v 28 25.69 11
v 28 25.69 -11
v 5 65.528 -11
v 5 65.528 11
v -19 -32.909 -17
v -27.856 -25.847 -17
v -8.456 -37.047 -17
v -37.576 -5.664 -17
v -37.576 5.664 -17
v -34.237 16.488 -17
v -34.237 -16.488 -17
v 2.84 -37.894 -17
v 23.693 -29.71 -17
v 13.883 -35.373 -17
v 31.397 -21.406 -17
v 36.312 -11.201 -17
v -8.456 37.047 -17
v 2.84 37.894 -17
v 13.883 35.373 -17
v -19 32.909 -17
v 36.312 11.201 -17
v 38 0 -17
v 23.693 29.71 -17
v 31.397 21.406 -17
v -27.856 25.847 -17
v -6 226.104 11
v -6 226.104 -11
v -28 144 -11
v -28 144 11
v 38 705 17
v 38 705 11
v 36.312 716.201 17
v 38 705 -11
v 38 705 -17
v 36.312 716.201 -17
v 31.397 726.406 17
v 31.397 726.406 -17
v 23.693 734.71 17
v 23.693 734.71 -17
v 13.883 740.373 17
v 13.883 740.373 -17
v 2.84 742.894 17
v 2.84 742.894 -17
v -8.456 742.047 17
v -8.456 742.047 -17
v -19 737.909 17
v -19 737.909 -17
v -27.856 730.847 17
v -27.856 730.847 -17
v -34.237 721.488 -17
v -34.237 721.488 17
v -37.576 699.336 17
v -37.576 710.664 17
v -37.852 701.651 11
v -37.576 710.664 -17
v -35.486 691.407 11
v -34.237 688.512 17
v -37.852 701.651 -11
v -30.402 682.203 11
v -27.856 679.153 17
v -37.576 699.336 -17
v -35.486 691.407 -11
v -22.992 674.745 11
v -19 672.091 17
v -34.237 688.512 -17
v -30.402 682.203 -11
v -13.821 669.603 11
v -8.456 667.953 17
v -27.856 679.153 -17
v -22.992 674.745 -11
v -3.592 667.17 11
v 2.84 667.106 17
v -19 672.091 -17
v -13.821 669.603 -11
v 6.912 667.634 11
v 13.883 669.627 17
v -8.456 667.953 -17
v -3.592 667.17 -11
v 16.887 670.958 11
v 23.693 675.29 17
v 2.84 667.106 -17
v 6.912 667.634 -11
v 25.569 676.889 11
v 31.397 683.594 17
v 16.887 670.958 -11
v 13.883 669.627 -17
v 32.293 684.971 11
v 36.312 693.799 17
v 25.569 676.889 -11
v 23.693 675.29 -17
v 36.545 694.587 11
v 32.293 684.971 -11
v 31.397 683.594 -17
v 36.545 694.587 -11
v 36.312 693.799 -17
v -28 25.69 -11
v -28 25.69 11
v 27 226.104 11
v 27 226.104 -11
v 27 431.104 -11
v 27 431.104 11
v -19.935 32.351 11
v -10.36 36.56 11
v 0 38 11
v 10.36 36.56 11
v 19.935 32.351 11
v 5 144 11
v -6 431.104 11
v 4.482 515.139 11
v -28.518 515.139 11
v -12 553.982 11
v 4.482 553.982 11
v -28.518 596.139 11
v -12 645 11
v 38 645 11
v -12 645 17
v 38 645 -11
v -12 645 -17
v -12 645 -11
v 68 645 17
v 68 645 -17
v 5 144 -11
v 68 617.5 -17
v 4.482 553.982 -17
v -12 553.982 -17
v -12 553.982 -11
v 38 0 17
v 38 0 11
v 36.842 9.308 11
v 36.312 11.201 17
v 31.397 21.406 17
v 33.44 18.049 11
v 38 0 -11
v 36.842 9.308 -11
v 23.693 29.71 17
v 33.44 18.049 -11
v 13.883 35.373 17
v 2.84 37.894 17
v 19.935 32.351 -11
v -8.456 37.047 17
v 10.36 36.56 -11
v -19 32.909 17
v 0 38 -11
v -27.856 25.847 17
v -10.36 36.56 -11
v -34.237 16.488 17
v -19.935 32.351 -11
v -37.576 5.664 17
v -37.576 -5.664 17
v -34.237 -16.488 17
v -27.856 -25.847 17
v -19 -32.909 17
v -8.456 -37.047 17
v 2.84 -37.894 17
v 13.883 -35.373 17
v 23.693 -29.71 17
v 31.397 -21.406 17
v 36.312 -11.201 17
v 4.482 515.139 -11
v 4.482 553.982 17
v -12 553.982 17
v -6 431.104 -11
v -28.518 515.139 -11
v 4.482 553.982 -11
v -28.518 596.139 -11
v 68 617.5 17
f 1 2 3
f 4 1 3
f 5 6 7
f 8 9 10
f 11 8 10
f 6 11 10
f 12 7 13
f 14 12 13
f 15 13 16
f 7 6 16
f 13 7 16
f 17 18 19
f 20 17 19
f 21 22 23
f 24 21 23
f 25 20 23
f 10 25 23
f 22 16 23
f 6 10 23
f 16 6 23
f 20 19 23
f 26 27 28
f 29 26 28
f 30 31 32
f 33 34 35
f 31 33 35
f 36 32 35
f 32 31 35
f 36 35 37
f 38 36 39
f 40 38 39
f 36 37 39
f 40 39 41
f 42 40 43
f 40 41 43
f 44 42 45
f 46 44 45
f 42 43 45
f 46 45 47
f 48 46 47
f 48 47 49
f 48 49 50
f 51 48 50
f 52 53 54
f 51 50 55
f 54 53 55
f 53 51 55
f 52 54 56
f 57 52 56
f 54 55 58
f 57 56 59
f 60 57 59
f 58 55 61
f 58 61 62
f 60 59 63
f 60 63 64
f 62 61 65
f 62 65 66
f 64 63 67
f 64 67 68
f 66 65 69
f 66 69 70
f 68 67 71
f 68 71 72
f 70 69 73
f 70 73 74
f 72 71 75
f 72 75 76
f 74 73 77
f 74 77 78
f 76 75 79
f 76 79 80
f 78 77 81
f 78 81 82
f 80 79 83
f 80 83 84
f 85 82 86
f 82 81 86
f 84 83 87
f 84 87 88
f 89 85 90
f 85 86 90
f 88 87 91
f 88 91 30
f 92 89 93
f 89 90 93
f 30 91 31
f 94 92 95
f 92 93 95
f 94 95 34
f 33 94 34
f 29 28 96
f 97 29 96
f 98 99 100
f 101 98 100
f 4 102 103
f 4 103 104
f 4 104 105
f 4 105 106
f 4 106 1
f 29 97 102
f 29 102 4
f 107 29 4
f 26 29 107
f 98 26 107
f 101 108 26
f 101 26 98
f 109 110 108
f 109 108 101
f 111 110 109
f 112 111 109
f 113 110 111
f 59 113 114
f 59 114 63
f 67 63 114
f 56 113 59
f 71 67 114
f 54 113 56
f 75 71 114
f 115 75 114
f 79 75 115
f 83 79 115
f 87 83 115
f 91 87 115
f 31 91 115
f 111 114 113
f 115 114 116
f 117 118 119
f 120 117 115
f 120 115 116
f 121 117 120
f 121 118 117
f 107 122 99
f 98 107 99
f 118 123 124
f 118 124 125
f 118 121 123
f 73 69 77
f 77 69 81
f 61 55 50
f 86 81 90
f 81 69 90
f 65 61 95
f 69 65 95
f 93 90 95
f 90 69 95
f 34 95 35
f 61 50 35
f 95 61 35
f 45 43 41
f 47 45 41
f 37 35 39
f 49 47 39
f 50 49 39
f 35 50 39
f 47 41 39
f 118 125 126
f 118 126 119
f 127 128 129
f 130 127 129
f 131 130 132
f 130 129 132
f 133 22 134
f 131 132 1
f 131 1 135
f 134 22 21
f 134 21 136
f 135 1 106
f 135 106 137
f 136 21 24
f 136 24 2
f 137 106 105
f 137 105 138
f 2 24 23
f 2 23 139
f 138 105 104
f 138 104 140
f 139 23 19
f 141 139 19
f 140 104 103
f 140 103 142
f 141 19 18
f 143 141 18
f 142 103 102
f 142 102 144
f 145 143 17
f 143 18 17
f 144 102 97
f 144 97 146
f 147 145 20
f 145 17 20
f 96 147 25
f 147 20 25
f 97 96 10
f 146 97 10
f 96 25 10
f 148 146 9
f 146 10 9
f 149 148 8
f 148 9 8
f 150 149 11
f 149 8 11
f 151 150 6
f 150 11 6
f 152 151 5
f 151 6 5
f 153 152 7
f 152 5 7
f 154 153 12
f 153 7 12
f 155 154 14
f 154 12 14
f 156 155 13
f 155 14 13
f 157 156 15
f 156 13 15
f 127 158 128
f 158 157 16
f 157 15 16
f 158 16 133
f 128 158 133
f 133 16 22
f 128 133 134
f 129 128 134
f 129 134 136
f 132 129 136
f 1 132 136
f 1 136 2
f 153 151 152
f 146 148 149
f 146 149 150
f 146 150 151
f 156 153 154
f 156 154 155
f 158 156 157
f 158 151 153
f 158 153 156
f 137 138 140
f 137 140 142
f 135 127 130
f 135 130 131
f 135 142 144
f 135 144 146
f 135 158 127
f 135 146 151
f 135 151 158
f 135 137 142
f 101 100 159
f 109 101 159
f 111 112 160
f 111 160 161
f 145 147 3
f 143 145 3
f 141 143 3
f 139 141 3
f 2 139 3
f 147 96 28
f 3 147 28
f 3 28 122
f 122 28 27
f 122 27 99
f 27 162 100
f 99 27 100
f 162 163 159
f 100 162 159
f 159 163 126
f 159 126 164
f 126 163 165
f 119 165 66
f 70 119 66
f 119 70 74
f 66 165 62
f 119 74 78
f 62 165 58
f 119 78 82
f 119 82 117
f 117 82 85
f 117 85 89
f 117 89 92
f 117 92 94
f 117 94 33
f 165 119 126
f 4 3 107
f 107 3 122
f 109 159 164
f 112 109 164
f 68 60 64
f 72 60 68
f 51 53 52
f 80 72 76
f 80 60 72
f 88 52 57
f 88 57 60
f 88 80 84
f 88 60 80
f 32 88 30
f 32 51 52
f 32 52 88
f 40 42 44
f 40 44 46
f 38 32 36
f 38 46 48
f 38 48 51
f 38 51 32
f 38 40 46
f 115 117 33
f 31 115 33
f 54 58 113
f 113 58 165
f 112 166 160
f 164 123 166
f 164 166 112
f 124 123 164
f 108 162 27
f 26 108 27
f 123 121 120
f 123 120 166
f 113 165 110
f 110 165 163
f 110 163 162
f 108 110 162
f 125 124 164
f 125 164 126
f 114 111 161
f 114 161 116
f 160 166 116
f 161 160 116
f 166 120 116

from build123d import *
from build123d.topology import SkipClean

# Parameters (mm, degrees)
BOSS_EXTRUDE1_DEPTH      = 11
BOSS_EXTRUDE1_DEPTH_BACK = 11
BOSS_EXTRUDE2_DEPTH      = 17
BOSS_EXTRUDE2_DEPTH_BACK = 17
SKETCH3_R                = 38


with BuildPart() as part:
    # Sketch1 → Boss-Extrude1 (new, two sides: drawn at the far end of the back side and taken through both)
    with BuildSketch(Plane.XY.offset(-BOSS_EXTRUDE1_DEPTH_BACK)):
        with BuildLine():
            Line((-28, 144), (-28, 25.690465157))
            ThreePointArc((-28, 25.690465157), (0, -38), (28, 25.690465157))
            Line((28, 25.690465157), (5, 65.527633731))
            Line((5, 65.527633731), (5, 144))
            Line((5, 144), (26.999618834, 226.103695235))
            Line((26.999618834, 226.103695235), (26.999618834, 431.103695235))
            Line((26.999618834, 431.103695235), (4.48236191, 515.139242122))
            Line((4.48236191, 515.139242122), (4.48236191, 553.98236191))
            Line((4.48236191, 553.98236191), (68, 617.5))
            Line((68, 617.5), (68, 645))
            Line((68, 645), (38, 645))
            Line((38, 645), (38, 705))
            ThreePointArc((38, 705), (-1.675998364, 742.96302187), (-37.852159447, 701.651265129))
            Line((-37.852159447, 701.651265129), (-28.51763809, 596.139242122))
            Line((-28.51763809, 596.139242122), (-28.51763809, 515.139242122))
            Line((-28.51763809, 515.139242122), (-6.000381166, 431.103695235))
            Line((-6.000381166, 431.103695235), (-6.000381166, 226.103695235))
            Line((-6.000381166, 226.103695235), (-28, 144))
        make_face()
    extrude(amount=BOSS_EXTRUDE1_DEPTH + BOSS_EXTRUDE1_DEPTH_BACK)

    # Sketch3 → Boss-Extrude2 (add, two sides: drawn at the far end of the back side and taken through both)
    with SkipClean():  # the faces are left unmerged after this step: merging them gives an invalid solid
        with BuildSketch(Plane.XY.offset(-BOSS_EXTRUDE2_DEPTH_BACK)):
            with Locations((0, 705)):
                Circle(SKETCH3_R)
            Circle(SKETCH3_R)
            Polygon((68, 617.5), (4.48236191, 553.98236191), (-12, 553.98236191), (-12, 645), (68, 645), align=None)
        extrude(amount=BOSS_EXTRUDE2_DEPTH + BOSS_EXTRUDE2_DEPTH_BACK)
    add(part.part.scale(1), mode=Mode.REPLACE)  # the faces are merged on a copy


solid = part.part
